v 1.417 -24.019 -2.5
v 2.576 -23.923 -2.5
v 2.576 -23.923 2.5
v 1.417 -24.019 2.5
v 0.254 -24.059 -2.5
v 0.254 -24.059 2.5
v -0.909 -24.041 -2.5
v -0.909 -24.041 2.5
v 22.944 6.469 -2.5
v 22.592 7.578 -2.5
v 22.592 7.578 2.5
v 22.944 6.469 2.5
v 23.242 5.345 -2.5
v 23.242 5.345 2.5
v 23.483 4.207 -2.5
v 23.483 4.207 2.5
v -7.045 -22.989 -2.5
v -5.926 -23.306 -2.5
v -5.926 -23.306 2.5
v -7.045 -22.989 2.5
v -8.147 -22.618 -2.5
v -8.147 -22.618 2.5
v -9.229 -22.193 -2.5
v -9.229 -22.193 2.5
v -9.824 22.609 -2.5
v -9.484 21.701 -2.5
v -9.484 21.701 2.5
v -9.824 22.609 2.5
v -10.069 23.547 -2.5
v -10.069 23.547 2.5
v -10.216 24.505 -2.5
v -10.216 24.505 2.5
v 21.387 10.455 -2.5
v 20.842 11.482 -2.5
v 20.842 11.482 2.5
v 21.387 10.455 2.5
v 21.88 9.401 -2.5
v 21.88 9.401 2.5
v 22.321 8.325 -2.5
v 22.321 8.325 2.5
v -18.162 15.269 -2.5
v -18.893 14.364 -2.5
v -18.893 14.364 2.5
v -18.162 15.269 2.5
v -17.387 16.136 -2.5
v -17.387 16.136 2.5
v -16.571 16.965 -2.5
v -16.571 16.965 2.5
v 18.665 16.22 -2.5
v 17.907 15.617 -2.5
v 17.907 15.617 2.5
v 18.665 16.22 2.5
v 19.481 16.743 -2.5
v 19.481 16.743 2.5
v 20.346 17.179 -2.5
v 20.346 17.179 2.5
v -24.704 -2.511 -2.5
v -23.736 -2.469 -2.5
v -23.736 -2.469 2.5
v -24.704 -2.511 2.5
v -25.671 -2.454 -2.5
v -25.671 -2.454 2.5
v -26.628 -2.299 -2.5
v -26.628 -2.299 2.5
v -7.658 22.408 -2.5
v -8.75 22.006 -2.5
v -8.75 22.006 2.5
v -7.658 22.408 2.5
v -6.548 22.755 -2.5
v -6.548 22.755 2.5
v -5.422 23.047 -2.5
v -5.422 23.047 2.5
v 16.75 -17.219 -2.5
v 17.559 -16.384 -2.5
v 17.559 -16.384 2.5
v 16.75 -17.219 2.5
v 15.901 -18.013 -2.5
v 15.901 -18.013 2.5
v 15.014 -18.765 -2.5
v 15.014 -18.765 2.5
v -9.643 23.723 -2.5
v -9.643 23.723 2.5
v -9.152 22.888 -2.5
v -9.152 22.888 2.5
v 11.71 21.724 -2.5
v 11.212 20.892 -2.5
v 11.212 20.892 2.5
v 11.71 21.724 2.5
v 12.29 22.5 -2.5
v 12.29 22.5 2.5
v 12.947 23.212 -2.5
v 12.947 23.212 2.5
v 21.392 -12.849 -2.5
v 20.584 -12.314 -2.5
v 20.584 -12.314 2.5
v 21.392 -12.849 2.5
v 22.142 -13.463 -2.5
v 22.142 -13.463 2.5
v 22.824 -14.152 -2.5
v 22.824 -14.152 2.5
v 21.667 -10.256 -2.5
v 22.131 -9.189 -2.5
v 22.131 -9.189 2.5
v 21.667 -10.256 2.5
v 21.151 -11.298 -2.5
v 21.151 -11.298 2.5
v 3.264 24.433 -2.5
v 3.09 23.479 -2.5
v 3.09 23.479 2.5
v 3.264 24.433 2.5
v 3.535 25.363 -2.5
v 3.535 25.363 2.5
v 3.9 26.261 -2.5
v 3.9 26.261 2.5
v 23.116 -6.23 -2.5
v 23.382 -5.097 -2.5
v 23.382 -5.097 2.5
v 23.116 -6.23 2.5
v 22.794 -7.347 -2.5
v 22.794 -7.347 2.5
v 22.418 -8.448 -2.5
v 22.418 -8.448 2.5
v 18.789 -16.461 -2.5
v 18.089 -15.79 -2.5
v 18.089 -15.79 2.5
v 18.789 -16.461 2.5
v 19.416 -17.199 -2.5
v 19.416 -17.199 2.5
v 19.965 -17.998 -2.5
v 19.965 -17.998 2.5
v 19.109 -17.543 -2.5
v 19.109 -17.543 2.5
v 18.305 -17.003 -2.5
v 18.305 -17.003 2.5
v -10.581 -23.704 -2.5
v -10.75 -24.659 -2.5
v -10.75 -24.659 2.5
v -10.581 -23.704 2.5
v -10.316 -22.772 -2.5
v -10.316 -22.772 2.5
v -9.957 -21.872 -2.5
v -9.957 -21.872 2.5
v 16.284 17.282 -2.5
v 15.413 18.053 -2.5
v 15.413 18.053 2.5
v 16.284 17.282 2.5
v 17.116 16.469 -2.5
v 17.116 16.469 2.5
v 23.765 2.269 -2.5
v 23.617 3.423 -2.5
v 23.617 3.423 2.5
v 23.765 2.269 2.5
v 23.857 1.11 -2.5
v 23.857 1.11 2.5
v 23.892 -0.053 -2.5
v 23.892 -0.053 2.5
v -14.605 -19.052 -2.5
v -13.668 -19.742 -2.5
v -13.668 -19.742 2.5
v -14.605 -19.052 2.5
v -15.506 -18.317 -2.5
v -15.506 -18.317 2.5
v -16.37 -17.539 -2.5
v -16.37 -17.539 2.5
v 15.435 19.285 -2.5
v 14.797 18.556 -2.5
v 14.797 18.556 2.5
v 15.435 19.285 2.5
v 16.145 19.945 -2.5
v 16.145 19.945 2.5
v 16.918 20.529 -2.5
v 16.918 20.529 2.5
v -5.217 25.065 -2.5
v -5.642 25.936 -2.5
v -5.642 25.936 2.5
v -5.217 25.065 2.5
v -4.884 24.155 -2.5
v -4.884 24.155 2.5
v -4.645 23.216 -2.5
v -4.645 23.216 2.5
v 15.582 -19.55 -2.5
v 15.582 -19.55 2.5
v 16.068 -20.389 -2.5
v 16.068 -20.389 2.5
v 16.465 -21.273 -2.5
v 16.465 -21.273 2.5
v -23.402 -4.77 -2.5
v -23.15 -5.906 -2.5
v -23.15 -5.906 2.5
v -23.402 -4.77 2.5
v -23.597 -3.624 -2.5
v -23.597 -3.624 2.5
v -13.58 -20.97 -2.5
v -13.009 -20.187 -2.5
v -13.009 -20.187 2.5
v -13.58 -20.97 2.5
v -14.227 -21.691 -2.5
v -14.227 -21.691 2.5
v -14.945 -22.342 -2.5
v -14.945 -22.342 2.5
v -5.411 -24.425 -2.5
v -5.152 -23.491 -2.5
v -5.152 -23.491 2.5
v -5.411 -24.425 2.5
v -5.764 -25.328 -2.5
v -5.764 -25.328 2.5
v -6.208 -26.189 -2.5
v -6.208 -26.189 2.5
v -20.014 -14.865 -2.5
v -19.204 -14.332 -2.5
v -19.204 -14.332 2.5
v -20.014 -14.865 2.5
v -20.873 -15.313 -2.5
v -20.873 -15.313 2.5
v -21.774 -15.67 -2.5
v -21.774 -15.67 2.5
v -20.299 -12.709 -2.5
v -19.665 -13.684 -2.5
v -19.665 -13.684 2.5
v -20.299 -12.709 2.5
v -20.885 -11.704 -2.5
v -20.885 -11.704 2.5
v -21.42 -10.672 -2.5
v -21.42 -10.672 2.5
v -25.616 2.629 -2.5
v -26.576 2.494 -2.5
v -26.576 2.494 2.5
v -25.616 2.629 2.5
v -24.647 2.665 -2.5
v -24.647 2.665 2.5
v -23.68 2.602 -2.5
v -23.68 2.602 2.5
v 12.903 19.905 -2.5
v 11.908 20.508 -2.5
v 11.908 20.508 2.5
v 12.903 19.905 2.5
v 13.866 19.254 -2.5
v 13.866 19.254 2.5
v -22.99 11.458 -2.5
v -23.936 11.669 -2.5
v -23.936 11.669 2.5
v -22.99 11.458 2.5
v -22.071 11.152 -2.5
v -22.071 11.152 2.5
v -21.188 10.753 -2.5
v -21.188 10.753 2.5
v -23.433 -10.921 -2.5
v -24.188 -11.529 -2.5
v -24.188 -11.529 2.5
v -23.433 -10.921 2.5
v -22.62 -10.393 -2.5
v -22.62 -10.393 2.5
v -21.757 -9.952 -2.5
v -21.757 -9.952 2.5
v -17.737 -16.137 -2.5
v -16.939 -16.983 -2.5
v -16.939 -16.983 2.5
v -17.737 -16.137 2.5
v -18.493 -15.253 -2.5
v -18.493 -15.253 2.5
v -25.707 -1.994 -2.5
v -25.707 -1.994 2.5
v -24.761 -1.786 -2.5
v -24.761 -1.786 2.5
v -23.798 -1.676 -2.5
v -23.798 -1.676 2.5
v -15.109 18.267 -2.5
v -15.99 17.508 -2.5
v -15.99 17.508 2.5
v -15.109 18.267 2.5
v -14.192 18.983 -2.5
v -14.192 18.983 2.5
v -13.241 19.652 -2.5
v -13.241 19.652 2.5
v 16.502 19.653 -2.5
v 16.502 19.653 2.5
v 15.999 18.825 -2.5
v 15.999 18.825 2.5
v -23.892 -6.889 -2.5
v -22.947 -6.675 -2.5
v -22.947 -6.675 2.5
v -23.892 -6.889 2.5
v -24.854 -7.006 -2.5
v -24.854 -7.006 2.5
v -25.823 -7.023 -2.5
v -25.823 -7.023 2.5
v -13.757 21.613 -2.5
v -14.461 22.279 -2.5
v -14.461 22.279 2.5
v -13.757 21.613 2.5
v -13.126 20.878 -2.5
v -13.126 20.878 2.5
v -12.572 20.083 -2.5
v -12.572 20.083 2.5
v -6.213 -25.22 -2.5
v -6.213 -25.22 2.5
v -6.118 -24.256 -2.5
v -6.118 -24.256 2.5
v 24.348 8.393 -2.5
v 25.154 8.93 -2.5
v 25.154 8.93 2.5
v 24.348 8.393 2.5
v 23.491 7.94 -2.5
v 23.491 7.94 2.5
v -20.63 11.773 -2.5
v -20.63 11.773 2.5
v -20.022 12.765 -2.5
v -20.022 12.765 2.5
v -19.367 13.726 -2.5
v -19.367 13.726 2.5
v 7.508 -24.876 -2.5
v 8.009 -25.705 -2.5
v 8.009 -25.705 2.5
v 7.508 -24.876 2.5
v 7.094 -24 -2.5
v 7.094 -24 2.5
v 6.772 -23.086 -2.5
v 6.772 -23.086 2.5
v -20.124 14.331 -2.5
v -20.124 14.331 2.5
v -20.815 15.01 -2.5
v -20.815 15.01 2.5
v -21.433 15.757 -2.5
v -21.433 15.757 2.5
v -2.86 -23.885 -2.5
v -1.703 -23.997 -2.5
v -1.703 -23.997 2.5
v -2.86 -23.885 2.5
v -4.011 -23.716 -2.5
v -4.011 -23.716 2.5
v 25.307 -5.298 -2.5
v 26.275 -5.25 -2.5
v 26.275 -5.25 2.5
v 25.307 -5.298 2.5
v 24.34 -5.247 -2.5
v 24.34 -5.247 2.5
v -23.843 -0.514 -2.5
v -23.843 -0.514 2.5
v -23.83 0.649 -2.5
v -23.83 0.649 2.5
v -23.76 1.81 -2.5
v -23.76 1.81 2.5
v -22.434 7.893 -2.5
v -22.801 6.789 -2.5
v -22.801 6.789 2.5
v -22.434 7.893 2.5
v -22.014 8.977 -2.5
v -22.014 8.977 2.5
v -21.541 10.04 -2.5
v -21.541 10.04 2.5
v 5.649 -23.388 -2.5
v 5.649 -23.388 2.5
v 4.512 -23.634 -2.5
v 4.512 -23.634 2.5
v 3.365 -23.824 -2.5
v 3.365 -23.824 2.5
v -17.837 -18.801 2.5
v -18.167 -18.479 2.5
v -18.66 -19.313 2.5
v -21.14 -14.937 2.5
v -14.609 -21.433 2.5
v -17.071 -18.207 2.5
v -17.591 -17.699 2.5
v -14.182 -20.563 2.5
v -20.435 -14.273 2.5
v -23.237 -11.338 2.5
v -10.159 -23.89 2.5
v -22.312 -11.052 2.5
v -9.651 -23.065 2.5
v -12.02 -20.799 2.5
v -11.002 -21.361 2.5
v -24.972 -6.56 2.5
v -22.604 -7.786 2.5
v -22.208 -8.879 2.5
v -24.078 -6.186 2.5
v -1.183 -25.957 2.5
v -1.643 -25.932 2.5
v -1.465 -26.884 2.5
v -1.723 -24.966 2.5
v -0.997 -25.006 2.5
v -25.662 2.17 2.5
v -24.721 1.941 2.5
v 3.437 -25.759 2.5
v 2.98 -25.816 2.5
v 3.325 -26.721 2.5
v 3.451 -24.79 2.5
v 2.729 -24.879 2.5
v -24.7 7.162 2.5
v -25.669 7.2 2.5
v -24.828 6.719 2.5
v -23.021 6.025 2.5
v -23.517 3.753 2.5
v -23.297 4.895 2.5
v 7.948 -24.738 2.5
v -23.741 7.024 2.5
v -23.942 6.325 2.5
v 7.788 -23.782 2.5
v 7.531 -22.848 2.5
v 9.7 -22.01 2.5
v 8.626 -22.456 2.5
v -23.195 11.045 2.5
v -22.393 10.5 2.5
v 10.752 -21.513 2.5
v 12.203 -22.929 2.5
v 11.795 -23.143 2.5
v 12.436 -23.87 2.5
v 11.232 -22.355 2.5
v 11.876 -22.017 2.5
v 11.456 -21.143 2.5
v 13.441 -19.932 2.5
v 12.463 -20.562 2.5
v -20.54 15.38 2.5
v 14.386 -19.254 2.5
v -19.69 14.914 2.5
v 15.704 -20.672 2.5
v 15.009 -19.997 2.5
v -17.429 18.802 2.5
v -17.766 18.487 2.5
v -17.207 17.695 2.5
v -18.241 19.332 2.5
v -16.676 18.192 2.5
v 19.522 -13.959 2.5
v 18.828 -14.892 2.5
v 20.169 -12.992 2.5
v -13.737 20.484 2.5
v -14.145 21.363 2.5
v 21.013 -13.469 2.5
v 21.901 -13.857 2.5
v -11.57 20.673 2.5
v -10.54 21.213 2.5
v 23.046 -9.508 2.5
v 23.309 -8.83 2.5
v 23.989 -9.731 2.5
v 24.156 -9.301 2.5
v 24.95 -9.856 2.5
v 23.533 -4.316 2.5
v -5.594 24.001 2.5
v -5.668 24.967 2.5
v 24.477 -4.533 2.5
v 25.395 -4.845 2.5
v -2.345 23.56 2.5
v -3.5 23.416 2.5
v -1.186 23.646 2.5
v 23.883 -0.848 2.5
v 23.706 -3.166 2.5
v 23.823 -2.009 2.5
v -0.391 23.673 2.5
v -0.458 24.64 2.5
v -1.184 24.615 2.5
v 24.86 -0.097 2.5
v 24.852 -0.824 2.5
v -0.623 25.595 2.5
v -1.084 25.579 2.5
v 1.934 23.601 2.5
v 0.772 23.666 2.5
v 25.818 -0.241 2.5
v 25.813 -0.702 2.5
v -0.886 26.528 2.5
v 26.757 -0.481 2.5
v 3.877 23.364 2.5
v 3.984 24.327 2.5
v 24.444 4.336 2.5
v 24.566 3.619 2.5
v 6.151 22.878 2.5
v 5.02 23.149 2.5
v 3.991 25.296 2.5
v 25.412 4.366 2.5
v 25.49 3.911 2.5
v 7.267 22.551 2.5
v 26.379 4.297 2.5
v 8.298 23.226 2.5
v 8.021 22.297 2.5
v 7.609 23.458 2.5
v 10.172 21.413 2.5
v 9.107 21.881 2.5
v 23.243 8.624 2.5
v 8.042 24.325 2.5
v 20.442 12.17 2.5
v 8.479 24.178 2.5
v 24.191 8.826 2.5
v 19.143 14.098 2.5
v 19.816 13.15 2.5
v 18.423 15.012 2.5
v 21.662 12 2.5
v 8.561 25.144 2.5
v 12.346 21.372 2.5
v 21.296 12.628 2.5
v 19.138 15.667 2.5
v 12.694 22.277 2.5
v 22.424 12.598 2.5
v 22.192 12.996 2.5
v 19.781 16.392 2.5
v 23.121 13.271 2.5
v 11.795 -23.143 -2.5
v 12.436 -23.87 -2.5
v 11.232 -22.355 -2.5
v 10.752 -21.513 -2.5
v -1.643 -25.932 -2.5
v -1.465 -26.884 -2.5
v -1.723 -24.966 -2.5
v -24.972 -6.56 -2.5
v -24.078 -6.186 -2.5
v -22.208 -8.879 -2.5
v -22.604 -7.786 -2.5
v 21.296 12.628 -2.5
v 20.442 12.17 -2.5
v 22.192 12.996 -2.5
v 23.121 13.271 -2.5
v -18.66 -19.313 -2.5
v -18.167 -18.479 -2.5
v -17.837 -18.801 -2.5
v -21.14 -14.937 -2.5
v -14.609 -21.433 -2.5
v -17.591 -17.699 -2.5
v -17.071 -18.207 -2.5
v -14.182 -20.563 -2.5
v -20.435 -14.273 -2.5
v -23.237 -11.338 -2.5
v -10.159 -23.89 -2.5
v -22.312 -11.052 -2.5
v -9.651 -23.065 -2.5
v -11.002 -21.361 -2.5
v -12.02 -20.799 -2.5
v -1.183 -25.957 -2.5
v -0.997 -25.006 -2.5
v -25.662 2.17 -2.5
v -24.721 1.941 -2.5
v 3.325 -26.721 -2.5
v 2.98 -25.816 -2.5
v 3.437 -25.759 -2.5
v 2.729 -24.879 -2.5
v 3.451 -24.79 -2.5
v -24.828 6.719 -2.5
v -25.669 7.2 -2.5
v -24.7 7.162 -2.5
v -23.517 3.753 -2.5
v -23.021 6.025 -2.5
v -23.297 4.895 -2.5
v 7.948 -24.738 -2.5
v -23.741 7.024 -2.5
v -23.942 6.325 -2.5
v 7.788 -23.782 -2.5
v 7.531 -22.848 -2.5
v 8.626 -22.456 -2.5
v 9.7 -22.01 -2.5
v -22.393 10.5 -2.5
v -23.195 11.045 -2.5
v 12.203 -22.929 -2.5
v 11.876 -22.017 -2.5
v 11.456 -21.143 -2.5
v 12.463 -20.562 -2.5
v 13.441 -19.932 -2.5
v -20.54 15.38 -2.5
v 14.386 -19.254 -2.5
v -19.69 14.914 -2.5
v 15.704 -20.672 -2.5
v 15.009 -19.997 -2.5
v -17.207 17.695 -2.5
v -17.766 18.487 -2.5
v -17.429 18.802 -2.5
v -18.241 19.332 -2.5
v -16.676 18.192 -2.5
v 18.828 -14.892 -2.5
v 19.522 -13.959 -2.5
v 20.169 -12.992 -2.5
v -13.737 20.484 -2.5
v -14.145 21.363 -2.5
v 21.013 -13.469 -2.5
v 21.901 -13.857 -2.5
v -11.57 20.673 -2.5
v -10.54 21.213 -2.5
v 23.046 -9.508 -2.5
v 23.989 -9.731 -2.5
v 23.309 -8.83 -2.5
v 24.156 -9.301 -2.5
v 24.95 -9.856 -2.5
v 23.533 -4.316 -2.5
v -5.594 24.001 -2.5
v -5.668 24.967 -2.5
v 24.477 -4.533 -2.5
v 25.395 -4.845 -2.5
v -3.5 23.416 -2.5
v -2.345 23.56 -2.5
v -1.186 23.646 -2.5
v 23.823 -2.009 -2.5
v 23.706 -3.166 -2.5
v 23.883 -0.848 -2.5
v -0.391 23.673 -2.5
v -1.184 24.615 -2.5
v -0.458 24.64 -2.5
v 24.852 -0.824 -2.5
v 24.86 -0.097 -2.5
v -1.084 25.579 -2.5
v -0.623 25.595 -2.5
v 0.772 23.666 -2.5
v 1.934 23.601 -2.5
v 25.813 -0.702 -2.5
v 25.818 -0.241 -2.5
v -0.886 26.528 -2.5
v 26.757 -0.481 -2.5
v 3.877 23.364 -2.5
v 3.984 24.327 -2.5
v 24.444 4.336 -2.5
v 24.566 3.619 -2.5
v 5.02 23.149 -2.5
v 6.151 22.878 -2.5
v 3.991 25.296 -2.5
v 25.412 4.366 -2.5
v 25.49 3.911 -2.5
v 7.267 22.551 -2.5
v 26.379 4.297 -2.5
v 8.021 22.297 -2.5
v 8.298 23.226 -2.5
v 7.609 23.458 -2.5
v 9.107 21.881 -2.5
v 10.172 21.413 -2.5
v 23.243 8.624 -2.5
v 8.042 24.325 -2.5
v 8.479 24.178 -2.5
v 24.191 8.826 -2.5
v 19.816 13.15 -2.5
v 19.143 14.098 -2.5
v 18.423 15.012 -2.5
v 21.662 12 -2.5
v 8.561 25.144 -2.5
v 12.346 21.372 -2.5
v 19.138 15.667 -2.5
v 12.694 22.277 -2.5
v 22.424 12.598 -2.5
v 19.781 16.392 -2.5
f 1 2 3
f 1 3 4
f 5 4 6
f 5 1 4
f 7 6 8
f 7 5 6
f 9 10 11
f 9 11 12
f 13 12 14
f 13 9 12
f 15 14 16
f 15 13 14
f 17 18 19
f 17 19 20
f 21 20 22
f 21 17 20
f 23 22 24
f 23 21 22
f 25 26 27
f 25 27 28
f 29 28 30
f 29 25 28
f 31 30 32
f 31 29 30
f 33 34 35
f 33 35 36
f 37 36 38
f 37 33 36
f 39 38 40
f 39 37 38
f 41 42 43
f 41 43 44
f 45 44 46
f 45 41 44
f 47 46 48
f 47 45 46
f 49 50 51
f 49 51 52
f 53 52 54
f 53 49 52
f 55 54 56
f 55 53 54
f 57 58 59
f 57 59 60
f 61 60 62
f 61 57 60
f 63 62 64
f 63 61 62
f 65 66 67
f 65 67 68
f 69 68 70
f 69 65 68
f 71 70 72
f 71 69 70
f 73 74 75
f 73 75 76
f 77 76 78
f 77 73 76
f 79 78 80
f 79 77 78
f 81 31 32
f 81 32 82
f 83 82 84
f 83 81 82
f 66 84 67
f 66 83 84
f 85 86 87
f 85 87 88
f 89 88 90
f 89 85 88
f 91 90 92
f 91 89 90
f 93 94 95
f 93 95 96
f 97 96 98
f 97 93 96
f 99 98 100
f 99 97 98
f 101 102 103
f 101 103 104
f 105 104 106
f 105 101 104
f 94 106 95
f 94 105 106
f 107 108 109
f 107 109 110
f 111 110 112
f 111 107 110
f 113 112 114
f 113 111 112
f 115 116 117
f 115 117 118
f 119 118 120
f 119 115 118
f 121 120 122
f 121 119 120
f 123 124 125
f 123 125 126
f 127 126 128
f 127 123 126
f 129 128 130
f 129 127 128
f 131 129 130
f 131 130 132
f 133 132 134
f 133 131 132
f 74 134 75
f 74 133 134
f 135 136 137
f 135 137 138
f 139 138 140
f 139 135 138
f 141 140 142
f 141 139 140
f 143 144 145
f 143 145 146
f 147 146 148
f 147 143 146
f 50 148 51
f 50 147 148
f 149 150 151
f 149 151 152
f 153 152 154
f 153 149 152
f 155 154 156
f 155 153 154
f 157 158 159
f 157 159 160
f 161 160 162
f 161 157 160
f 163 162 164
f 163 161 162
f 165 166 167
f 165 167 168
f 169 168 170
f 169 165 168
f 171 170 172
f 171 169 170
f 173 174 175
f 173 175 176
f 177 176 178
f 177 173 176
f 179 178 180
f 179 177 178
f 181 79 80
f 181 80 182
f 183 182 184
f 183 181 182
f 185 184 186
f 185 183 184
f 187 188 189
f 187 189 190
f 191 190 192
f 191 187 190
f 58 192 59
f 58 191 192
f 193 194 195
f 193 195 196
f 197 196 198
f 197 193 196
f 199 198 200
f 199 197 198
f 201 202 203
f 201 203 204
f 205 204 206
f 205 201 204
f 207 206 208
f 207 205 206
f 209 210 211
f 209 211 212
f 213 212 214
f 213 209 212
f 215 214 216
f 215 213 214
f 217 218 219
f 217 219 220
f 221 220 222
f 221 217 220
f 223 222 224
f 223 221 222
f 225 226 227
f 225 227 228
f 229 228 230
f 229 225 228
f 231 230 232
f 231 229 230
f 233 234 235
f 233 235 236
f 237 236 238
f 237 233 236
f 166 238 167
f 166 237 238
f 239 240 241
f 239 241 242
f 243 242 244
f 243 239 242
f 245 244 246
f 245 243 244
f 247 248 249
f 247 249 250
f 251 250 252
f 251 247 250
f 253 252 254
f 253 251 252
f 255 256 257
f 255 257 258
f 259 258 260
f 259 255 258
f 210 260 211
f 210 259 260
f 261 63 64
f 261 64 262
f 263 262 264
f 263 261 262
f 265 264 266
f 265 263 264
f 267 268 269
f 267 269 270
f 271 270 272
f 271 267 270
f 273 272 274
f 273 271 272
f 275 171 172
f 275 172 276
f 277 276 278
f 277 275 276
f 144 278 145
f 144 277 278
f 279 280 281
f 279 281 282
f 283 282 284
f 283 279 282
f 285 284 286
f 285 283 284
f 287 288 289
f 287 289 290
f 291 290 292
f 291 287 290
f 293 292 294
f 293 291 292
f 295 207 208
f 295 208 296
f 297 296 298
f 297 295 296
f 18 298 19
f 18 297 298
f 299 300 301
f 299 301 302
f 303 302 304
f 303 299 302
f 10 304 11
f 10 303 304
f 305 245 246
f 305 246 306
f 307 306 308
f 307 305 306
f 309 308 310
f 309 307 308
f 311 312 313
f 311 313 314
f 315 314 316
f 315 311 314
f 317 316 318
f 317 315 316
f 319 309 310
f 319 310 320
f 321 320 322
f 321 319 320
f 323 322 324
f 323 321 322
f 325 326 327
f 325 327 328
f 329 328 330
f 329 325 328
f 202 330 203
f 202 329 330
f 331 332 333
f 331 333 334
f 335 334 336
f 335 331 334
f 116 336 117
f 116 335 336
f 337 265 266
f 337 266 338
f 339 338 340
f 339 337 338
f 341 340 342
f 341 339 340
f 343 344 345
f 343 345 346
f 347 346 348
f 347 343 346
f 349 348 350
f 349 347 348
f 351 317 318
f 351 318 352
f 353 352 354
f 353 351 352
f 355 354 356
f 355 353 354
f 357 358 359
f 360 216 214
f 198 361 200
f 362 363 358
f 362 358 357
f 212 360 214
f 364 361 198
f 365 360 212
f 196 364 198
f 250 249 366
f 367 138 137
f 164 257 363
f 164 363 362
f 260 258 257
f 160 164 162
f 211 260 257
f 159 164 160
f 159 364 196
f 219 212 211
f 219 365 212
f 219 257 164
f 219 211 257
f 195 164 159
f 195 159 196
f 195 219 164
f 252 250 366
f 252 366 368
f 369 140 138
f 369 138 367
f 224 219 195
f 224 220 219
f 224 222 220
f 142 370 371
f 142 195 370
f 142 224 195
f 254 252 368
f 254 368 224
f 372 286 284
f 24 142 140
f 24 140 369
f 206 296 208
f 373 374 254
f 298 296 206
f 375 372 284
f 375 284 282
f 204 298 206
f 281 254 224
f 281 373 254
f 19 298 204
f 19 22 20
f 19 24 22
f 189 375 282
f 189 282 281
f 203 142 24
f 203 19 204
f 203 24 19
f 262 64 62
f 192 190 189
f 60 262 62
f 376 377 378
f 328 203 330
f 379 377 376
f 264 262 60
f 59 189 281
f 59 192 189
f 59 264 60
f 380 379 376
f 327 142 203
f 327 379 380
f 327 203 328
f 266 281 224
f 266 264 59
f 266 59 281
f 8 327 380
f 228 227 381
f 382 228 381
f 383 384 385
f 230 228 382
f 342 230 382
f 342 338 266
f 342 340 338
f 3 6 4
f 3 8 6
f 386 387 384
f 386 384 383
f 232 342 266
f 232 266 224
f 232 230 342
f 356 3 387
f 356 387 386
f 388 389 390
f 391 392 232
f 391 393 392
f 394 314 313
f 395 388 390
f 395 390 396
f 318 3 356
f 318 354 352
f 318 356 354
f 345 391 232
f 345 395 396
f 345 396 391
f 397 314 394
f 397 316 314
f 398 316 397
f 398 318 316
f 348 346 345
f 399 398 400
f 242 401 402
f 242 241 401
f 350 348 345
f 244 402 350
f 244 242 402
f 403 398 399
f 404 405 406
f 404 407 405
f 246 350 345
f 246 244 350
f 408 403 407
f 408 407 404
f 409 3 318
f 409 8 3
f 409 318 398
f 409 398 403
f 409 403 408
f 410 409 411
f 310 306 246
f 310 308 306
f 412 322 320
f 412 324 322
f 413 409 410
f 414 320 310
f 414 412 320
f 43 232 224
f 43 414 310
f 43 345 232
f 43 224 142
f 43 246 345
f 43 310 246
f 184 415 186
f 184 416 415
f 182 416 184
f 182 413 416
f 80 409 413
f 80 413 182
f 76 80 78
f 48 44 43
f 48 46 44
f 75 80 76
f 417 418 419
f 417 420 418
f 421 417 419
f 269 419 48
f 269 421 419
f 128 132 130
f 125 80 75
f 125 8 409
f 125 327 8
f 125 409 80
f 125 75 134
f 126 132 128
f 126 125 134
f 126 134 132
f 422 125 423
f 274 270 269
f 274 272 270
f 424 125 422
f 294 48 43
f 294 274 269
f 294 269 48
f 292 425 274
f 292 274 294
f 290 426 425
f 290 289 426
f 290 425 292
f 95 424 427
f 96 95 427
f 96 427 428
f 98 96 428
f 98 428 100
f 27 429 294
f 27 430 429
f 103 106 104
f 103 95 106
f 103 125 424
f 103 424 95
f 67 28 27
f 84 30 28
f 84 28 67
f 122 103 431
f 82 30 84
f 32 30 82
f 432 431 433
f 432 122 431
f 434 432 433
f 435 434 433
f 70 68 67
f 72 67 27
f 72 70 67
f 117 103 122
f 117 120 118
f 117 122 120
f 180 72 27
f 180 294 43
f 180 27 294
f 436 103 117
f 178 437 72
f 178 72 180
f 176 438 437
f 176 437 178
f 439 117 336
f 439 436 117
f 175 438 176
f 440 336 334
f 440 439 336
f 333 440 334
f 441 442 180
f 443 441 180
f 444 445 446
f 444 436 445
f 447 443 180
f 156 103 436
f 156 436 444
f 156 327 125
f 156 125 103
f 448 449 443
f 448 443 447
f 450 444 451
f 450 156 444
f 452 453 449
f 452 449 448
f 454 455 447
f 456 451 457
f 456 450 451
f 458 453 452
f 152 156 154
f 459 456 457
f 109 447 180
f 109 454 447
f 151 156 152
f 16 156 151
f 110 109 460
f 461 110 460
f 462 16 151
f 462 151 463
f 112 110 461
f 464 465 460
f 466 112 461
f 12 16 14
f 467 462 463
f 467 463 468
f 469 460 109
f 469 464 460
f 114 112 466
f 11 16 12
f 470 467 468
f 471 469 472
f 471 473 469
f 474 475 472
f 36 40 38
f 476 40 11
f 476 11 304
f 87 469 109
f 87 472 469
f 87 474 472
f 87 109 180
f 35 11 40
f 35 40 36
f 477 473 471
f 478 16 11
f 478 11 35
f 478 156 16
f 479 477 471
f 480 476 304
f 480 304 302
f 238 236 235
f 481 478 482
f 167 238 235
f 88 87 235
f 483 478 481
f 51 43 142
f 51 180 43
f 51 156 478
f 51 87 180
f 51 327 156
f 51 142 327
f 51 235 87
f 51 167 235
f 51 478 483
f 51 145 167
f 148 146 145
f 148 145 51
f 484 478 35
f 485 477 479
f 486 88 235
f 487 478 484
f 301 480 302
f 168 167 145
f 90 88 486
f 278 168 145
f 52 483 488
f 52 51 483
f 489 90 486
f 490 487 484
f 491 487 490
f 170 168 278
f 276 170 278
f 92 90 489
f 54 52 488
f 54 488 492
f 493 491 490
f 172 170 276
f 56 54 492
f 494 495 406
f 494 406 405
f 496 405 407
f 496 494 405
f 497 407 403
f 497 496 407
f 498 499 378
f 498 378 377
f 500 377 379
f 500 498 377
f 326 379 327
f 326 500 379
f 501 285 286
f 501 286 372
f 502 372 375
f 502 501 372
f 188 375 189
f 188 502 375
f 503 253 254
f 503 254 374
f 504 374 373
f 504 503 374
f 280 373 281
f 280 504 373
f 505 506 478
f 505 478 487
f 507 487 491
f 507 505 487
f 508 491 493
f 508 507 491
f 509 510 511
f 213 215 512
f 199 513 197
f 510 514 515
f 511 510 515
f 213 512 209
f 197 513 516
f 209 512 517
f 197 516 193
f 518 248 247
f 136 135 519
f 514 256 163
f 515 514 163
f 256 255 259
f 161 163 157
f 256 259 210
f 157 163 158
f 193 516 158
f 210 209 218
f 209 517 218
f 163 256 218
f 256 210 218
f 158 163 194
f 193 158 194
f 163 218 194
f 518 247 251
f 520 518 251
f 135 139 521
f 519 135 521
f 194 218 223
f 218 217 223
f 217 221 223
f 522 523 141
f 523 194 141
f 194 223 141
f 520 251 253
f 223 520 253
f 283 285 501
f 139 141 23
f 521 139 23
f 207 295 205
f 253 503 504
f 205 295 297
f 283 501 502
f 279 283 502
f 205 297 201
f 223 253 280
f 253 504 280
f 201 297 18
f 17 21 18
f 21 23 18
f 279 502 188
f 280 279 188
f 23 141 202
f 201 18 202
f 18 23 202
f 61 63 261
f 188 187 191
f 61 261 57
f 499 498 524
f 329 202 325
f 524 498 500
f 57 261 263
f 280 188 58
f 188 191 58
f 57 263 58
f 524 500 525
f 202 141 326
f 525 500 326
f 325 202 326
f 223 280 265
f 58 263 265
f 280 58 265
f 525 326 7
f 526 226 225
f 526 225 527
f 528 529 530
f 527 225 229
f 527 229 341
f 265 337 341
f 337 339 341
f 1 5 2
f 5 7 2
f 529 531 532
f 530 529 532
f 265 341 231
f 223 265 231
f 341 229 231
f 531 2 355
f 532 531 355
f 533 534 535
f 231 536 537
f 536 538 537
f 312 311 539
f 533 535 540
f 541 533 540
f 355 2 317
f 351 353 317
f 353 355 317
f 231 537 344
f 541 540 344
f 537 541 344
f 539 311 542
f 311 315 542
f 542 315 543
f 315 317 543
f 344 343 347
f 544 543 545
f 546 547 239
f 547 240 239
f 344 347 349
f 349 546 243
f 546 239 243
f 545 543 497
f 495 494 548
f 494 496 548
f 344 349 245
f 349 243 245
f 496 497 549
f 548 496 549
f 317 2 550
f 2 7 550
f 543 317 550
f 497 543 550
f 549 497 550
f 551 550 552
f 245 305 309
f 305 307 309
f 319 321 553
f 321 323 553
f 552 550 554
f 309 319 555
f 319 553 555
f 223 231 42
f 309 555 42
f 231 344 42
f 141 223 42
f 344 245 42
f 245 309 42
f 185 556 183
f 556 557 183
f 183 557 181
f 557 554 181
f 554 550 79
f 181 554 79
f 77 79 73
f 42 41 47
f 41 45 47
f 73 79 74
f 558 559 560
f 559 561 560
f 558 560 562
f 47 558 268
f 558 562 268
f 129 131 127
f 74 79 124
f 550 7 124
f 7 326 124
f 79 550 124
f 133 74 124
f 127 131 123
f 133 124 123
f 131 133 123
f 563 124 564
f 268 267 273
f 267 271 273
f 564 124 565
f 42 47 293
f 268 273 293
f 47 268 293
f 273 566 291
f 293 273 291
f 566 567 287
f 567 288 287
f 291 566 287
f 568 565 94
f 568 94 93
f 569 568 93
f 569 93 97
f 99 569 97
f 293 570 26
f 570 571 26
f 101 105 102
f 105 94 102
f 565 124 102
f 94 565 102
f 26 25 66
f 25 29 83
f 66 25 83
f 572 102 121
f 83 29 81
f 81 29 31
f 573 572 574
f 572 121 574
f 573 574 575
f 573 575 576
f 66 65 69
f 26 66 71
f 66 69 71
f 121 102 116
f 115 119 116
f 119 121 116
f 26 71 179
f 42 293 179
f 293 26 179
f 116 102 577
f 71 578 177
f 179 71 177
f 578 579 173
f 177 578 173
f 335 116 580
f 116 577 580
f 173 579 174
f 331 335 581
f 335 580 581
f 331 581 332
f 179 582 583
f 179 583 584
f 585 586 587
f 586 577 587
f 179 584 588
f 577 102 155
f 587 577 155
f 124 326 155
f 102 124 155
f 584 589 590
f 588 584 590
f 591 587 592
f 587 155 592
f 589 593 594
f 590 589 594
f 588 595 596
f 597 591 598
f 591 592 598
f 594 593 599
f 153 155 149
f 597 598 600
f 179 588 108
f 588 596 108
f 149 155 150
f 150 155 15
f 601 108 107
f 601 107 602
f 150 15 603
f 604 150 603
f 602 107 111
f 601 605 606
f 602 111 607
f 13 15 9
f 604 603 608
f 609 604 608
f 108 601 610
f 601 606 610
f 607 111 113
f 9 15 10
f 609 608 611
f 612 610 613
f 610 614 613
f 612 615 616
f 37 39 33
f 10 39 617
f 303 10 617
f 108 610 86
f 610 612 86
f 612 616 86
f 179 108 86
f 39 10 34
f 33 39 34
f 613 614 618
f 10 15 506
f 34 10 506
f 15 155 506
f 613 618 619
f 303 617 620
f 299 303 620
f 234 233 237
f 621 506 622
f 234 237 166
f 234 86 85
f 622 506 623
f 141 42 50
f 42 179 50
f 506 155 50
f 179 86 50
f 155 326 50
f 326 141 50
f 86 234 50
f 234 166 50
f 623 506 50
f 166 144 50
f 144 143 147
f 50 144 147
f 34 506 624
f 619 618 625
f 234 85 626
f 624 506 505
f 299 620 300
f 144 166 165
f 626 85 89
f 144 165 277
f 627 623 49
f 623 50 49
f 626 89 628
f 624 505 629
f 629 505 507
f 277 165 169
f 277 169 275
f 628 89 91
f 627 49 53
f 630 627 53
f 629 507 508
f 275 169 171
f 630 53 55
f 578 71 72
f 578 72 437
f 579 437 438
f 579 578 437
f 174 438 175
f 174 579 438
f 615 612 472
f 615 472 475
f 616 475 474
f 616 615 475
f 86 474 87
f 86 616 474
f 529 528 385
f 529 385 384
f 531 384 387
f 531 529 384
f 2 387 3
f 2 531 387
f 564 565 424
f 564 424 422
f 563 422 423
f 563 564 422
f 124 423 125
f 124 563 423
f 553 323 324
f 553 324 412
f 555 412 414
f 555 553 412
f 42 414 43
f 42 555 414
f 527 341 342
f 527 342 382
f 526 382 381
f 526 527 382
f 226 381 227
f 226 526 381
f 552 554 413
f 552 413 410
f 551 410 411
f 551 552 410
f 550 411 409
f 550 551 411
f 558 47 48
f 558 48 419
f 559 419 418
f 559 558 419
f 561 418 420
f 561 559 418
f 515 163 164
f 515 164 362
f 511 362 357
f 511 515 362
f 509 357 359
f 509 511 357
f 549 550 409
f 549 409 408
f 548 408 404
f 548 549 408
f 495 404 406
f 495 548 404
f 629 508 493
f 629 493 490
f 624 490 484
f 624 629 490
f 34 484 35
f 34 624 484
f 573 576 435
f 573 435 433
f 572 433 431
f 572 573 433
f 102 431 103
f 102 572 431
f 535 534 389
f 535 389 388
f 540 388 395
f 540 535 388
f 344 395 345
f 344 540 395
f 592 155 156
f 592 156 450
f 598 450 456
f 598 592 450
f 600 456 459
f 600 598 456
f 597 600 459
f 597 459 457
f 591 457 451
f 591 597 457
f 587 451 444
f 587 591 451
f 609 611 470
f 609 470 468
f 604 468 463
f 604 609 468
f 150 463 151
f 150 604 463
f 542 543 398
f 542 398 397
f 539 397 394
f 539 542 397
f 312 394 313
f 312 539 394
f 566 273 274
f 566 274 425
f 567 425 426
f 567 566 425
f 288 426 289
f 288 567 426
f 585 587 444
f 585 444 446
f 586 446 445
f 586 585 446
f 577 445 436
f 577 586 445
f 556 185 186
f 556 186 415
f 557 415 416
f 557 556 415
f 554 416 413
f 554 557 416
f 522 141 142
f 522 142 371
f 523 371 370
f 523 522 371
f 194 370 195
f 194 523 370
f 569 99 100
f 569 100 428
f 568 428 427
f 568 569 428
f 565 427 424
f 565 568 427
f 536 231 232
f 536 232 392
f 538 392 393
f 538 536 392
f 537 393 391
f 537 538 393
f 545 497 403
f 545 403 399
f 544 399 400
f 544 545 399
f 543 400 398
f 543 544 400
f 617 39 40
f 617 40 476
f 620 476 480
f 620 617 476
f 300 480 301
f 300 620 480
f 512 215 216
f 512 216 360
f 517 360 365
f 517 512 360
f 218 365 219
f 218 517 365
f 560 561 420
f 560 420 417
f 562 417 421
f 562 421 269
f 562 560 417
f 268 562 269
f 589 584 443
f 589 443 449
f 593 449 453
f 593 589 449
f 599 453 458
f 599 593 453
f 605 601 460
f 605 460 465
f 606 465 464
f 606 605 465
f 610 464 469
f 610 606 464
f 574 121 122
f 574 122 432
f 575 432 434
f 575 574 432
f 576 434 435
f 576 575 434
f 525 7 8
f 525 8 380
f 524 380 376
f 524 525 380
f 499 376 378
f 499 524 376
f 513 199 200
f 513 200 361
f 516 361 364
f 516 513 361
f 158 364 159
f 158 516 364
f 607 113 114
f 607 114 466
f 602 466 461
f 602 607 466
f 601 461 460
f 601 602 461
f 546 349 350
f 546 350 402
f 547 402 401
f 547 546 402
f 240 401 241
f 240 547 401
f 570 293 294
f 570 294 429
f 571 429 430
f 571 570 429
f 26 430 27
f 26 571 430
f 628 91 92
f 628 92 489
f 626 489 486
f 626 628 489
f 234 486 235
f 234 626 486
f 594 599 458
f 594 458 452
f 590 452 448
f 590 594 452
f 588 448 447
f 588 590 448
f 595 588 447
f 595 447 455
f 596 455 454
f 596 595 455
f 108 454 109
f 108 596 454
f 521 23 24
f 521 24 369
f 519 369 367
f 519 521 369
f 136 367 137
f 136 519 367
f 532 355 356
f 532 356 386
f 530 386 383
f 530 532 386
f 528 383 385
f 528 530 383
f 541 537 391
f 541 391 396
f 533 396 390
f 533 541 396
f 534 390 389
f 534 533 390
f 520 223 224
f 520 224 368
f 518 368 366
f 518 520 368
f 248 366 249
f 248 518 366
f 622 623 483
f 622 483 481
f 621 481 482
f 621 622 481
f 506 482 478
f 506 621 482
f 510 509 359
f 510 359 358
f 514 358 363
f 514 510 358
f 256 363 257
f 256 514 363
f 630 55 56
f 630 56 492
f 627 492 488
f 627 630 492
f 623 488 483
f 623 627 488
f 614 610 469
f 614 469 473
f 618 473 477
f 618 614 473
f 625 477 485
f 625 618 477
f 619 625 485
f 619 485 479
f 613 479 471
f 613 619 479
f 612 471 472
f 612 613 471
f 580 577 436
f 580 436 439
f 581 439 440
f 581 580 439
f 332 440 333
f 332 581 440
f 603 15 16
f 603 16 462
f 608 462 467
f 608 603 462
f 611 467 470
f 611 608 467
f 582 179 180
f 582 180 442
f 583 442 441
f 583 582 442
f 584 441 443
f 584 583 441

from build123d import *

# Parameters (mm, degrees)
SKETCH1_R           = 27.75
BOSS_EXTRUDE1_DEPTH = 2.5
CUT_EXTRUDE2_START  = -5
CUT_EXTRUDE2_DEPTH  = 45.561660734
CIRPATTERN7_START   = -2.5
CIRPATTERN7_DEPTH   = 5


# Read off the part's stored shape, not the designer's step: CirPattern7
with BuildPart() as part:
    # Sketch1 → Boss-Extrude1 (new, symmetric)
    with BuildSketch(Plane.XY):
        Circle(SKETCH1_R)
    extrude(amount=BOSS_EXTRUDE1_DEPTH, both=True)

    # Sketch2 → Cut-Extrude2 (cut)
    with BuildSketch(Plane.XY.offset(2.5).offset(CUT_EXTRUDE2_START)):
        with BuildLine():
            Line((-89.477738944, 138.434122816), (-6.339011816, 27.016280817))
            ThreePointArc((-6.339011816, 27.016280817), (-5.280523031, 25.210404562), (-4.64520927, 23.215921174))
            ThreePointArc((-4.64520927, 23.215921174), (-2.923319917, 23.494917872), (-1.18556258, 23.646382525))
            ThreePointArc((-1.18556258, 23.646382525), (-1.058374477, 25.735739063), (-0.474695323, 27.745939601))
            Line((-0.474695323, 27.745939601), (52.825792272, 156.14002625))
            Line((52.825792272, 156.14002625), (18.496309012, 432.048381388))
            Line((18.496309012, 432.048381388), (-123.807222203, 414.342477955))
            Line((-123.807222203, 414.342477955), (-89.477738944, 138.434122816))
        make_face()
    extrude(amount=CUT_EXTRUDE2_DEPTH, mode=Mode.SUBTRACT)

    # CirPattern7 outline → CirPattern7 (cut)
    with BuildSketch(Plane.XY.offset(CIRPATTERN7_START)):
        with BuildLine():
            ThreePointArc((3.090231156, 23.479240771), (3.387839331, 24.901248443), (3.899737771, 26.260894145))
            ThreePointArc((3.899737771, 26.260894145), (4.000041355, 24.811544071), (3.877171664, 23.363932423))
            ThreePointArc((3.877171664, 23.363932423), (5.587296935, 23.020110291), (7.267466816, 22.551312602))
            ThreePointArc((7.267466816, 22.551312602), (7.814201579, 23.897328035), (8.560647715, 25.143720674))
            ThreePointArc((8.560647715, 25.143720674), (8.40054793, 23.699752356), (8.021171765, 22.297343653))
            ThreePointArc((8.021171765, 22.297343653), (9.642422807, 21.653692226), (11.211884607, 20.892422392))
            ThreePointArc((11.211884607, 20.892422392), (11.990173454, 22.119183541), (12.947175892, 23.212263034))
            ThreePointArc((12.947175892, 23.212263034), (12.531818479, 21.820086801), (11.9081293, 20.507955613))
            ThreePointArc((11.9081293, 20.507955613), (13.388397772, 19.585162378), (14.796707697, 18.555888238))
            ThreePointArc((14.796707697, 18.555888238), (15.781535783, 19.623965991), (16.918335679, 20.528599863))
            ThreePointArc((16.918335679, 20.528599863), (16.261070565, 19.232961405), (15.413114258, 18.053280708))
            ThreePointArc((15.413114258, 18.053280708), (16.704823111, 16.881004998), (17.906716922, 15.616808269))
            ThreePointArc((17.906716922, 15.616808269), (19.066431063, 16.491873729), (20.346490732, 17.178986303))
            ThreePointArc((20.346490732, 17.178986303), (19.468442959, 16.021528506), (18.423473536, 15.012214208))
            ThreePointArc((18.423473536, 15.012214208), (19.485106186, 13.628133929), (20.441954027, 12.169646935))
            ThreePointArc((20.441954027, 12.169646935), (21.739280055, 12.823574777), (23.121457326, 13.271081689))
            ThreePointArc((23.121457326, 13.271081689), (22.050848071, 12.289006199), (20.842451711, 11.482498492))
            ThreePointArc((20.842451711, 11.482498492), (21.63988641, 9.931099123), (22.320934405, 8.325198837))
            ThreePointArc((22.320934405, 8.325198837), (23.714175195, 8.736971281), (25.154045753, 8.930489292))
            ThreePointArc((25.154045753, 8.930489292), (23.92528528, 8.155360823), (22.592300834, 7.577581529))
            ThreePointArc((22.592300834, 7.577581529), (23.099907376, 5.908726323), (23.48326608, 4.207027699))
            ThreePointArc((23.48326608, 4.207027699), (24.927641727, 4.363410042), (26.378926948, 4.296719323))
            ThreePointArc((26.378926948, 4.296719323), (25.031508628, 3.753451142), (23.616779314, 3.422970562))
            ThreePointArc((23.616779314, 3.422970562), (23.818242806, 1.690297897), (23.891590756, -0.052505069))
            ThreePointArc((23.891590756, -0.052505069), (25.340677838, -0.156539085), (26.756732221, -0.481295039))
            ThreePointArc((26.756732221, -0.481295039), (25.333963188, -0.775241846), (23.88295957, -0.847801793))
            ThreePointArc((23.88295957, -0.847801793), (23.771804811, -2.588602391), (23.532784543, -4.316494579))
            ThreePointArc((23.532784543, -4.316494579), (24.940008208, -4.677601215), (26.2753186, -5.249984481))
            ThreePointArc((26.2753186, -5.249984481), (24.822927822, -5.285162221), (23.38228635, -5.0974694))
            ThreePointArc((23.38228635, -5.0974694), (22.962085944, -6.790447167), (22.418379767, -8.4478927))
            ThreePointArc((22.418379767, -8.4478927), (23.738510689, -9.054465692), (24.950159115, -9.856079401))
            ThreePointArc((24.950159115, -9.856079401), (23.514827626, -9.631357433), (22.130851702, -9.189444445))
            ThreePointArc((22.130851702, -9.189444445), (21.415111237, -10.780185683), (20.584194314, -12.313912898))
            ThreePointArc((20.584194314, -12.313912898), (21.774802399, -13.14645649), (22.823845482, -14.151536117))
            ThreePointArc((22.823845482, -14.151536117), (21.451706017, -13.67413719), (20.168877767, -12.992207482))
            ThreePointArc((20.168877767, -12.992207482), (19.180601729, -14.429584459), (18.089180414, -15.790298101))
            ThreePointArc((18.089180414, -15.790298101), (19.111998539, -16.822053658), (19.964719171, -17.998295117))
            ThreePointArc((19.964719171, -17.998295117), (18.699873422, -17.283563225), (17.559424, -16.38353458))
            ThreePointArc((17.559424, -16.38353458), (16.330376395, -17.621348817), (15.013529867, -18.76531443))
            ThreePointArc((15.013529867, -18.76531443), (15.835683816, -19.963120479), (16.464674853, -21.272718402))
            ThreePointArc((16.464674853, -21.272718402), (15.347776003, -20.343625616), (14.386360394, -19.254425694))
            ThreePointArc((14.386360394, -19.254425694), (12.956043823, -20.252892823), (11.456096612, -21.143342411))
            ThreePointArc((11.456096612, -21.143342411), (12.05116168, -22.46870048), (12.436206834, -23.869563312))
            ThreePointArc((12.436206834, -23.869563312), (11.503152931, -22.755971439), (10.751671822, -21.512608022))
            ThreePointArc((10.751671822, -21.512608022), (9.166057836, -22.239636488), (7.531219481, -22.847950269))
            ThreePointArc((7.531219481, -22.847950269), (7.880069787, -24.258262259), (8.00879339, -25.705365116))
            ThreePointArc((8.00879339, -25.705365116), (7.289573554, -24.443065915), (6.772180166, -23.085501726))
            ThreePointArc((6.772180166, -23.085501726), (5.082231704, -23.517724236), (3.365047255, -23.824350504))
            ThreePointArc((3.365047255, -23.824350504), (3.456470463, -25.274287827), (3.324735232, -26.721119633))
            ThreePointArc((3.324735232, -26.721119633), (2.84246578, -25.350684439), (2.575789563, -23.922552708))
            ThreePointArc((2.575789563, -23.922552708), (0.835822959, -24.046077275), (-0.908515864, -24.041160809))
            ThreePointArc((-0.908515864, -24.041160809), (-1.077458171, -25.484121288), (-1.465418157, -26.884179678))
            ThreePointArc((-1.465418157, -26.884179678), (-1.695236688, -25.449655405), (-1.702624541, -23.996857461))
            ThreePointArc((-1.702624541, -23.996857461), (-3.436685329, -23.807713904), (-5.152114041, -23.491412724))
            ThreePointArc((-5.152114041, -23.491412724), (-5.575991918, -24.88101842), (-6.207707306, -26.189304365))
            ThreePointArc((-6.207707306, -26.189304365), (-6.177688358, -24.736797805), (-5.925550396, -23.30602777))
            ThreePointArc((-5.925550396, -23.30602777), (-7.597971228, -22.810295317), (-9.229354538, -22.192775603))
            ThreePointArc((-9.229354538, -22.192775603), (-9.894544201, -23.484363447), (-10.749711139, -24.658827561))
            ThreePointArc((-10.749711139, -24.658827561), (-10.460819547, -23.235023468), (-9.957259691, -21.872267467))
            ThreePointArc((-9.957259691, -21.872267467), (-11.514287585, -21.085879369), (-13.009191491, -20.186988713))
            ThreePointArc((-13.009191491, -20.186988713), (-13.894313197, -21.339046008), (-14.945445916, -22.341940047))
            ThreePointArc((-14.945445916, -22.341940047), (-14.406966893, -20.992600658), (-13.668169972, -19.741658791))
            ThreePointArc((-13.668169972, -19.741658791), (-15.059760769, -18.689890207), (-16.370137831, -17.538519694))
            ThreePointArc((-16.370137831, -17.538519694), (-17.44674304, -18.514018371), (-18.660057269, -19.313108496))
            ThreePointArc((-18.660057269, -19.313108496), (-17.889297974, -18.081602688), (-16.939009528, -16.982681256))
            ThreePointArc((-16.939009528, -16.982681256), (-18.120436356, -15.699336894), (-19.204169976, -14.33249252))
            ThreePointArc((-19.204169976, -14.33249252), (-20.437655711, -15.100079248), (-21.774154532, -15.669682045))
            ThreePointArc((-21.774154532, -15.669682045), (-20.795887804, -14.595591428), (-19.664650885, -13.68401067))
            ThreePointArc((-19.664650885, -13.68401067), (-20.597941714, -12.210338274), (-21.420199801, -10.671951541))
            ThreePointArc((-21.420199801, -10.671951541), (-22.770920816, -11.206955453), (-24.187648058, -11.528763419))
            ThreePointArc((-24.187648058, -11.528763419), (-23.033316193, -10.64661015), (-21.757489688, -9.95166902))
            ThreePointArc((-21.757489688, -9.95166902), (-22.412647782, -8.335033634), (-22.947002286, -6.674549558))
            ThreePointArc((-22.947002286, -6.674549558), (-24.371545295, -6.959775187), (-25.822966179, -7.023445149))
            ThreePointArc((-25.822966179, -7.023445149), (-24.529670354, -6.361582359), (-23.150260375, -5.905616839))
            ThreePointArc((-23.150260375, -5.905616839), (-23.506228415, -4.197978453), (-23.735504741, -2.468766359))
            ThreePointArc((-23.735504741, -2.468766359), (-25.188083761, -2.495046318), (-26.627548424, -2.298531872))
            ThreePointArc((-26.627548424, -2.298531872), (-25.23685623, -1.878232376), (-23.79819815, -1.675897571))
            ThreePointArc((-23.79819815, -1.675897571), (-23.843535029, 0.067858911), (-23.760364049, 1.810220724))
            ThreePointArc((-23.760364049, 1.810220724), (-25.194291994, 2.043731094), (-26.575534859, 2.494113813))
            ThreePointArc((-26.575534859, 2.494113813), (-25.132144288, 2.659341243), (-23.68047776, 2.601542124))
            ThreePointArc((-23.68047776, 2.601542124), (-23.413726315, 4.325370935), (-23.020781211, 6.024881525))
            ThreePointArc((-23.020781211, 6.024881525), (-24.389970458, 6.510677009), (-25.668597242, 7.200452329))
            ThreePointArc((-25.668597242, 7.200452329), (-24.218900054, 7.105297148), (-22.800882836, 6.789221817))
            ThreePointArc((-22.800882836, 6.789221817), (-22.230616676, 8.43771768), (-21.540527028, 10.039753379))
            ThreePointArc((-21.540527028, 10.039753379), (-22.800970707, 10.762220109), (-23.935885294, 11.669218084))
            ThreePointArc((-23.935885294, 11.669218084), (-22.52647595, 11.316738658), (-21.187684281, 10.752546037))
            ThreePointArc((-21.187684281, 10.752546037), (-20.332232231, 12.272724938), (-19.367178088, 13.725794999))
            ThreePointArc((-19.367178088, 13.725794999), (-20.478364503, 14.661712301), (-21.433089803, 15.75678127))
            ThreePointArc((-21.433089803, 15.75678127), (-20.109267878, 15.158306577), (-18.892731625, 14.36413028))
            ThreePointArc((-18.892731625, 14.36413028), (-17.779588617, 15.70713242), (-16.570587613, 16.964533976))
            ThreePointArc((-16.570587613, 16.964533976), (-17.496802318, 18.083820698), (-18.240652676, 19.331764243))
            ThreePointArc((-18.240652676, 19.331764243), (-17.044966897, 18.506529753), (-15.989786535, 17.50789526))
            ThreePointArc((-15.989786535, 17.50789526), (-14.654729902, 18.630555443), (-13.240640324, 19.651874574))
            ThreePointArc((-13.240640324, 19.651874574), (-13.952114016, 20.918555919), (-14.461181467, 22.279264108))
            ThreePointArc((-14.461181467, 22.279264108), (-13.432062159, 21.253793536), (-12.572152054, 20.082797781))
            ThreePointArc((-12.572152054, 20.082797781), (-11.058091614, 20.949032787), (-9.484363464, 21.701443455))
            ThreePointArc((-9.484363464, 21.701443455), (-9.958228794, 23.074807243), (-10.216151493, 24.504545795))
            ThreePointArc((-10.216151493, 24.504545795), (-9.386675397, 23.311798609), (-8.749673767, 22.00607836))
            ThreePointArc((-8.749673767, 22.00607836), (-7.105272668, 22.588046681), (-5.422486865, 23.047365789))
            ThreePointArc((-5.422486865, 23.047365789), (-5.643513409, 24.483270978), (-5.642001509, 25.936086919))
            ThreePointArc((-5.642001509, 25.936086919), (-5.972131243, 26.488040866), (-6.339011816, 27.016280817))
            ThreePointArc((-6.339011816, 27.016280817), (3.426332111, -27.537660545), (-0.474695323, 27.745939601))
            ThreePointArc((-0.474695323, 27.745939601), (-0.700942634, 27.143900603), (-0.885748459, 26.527876571))
            ThreePointArc((-0.885748459, 26.527876571), (-0.528265346, 25.119728046), (-0.39067943, 23.673440882))
            ThreePointArc((-0.39067943, 23.673440882), (1.353355237, 23.640498771), (3.090231156, 23.479240771))
        make_face()
    extrude(amount=CIRPATTERN7_DEPTH, mode=Mode.SUBTRACT)


solid = part.part
